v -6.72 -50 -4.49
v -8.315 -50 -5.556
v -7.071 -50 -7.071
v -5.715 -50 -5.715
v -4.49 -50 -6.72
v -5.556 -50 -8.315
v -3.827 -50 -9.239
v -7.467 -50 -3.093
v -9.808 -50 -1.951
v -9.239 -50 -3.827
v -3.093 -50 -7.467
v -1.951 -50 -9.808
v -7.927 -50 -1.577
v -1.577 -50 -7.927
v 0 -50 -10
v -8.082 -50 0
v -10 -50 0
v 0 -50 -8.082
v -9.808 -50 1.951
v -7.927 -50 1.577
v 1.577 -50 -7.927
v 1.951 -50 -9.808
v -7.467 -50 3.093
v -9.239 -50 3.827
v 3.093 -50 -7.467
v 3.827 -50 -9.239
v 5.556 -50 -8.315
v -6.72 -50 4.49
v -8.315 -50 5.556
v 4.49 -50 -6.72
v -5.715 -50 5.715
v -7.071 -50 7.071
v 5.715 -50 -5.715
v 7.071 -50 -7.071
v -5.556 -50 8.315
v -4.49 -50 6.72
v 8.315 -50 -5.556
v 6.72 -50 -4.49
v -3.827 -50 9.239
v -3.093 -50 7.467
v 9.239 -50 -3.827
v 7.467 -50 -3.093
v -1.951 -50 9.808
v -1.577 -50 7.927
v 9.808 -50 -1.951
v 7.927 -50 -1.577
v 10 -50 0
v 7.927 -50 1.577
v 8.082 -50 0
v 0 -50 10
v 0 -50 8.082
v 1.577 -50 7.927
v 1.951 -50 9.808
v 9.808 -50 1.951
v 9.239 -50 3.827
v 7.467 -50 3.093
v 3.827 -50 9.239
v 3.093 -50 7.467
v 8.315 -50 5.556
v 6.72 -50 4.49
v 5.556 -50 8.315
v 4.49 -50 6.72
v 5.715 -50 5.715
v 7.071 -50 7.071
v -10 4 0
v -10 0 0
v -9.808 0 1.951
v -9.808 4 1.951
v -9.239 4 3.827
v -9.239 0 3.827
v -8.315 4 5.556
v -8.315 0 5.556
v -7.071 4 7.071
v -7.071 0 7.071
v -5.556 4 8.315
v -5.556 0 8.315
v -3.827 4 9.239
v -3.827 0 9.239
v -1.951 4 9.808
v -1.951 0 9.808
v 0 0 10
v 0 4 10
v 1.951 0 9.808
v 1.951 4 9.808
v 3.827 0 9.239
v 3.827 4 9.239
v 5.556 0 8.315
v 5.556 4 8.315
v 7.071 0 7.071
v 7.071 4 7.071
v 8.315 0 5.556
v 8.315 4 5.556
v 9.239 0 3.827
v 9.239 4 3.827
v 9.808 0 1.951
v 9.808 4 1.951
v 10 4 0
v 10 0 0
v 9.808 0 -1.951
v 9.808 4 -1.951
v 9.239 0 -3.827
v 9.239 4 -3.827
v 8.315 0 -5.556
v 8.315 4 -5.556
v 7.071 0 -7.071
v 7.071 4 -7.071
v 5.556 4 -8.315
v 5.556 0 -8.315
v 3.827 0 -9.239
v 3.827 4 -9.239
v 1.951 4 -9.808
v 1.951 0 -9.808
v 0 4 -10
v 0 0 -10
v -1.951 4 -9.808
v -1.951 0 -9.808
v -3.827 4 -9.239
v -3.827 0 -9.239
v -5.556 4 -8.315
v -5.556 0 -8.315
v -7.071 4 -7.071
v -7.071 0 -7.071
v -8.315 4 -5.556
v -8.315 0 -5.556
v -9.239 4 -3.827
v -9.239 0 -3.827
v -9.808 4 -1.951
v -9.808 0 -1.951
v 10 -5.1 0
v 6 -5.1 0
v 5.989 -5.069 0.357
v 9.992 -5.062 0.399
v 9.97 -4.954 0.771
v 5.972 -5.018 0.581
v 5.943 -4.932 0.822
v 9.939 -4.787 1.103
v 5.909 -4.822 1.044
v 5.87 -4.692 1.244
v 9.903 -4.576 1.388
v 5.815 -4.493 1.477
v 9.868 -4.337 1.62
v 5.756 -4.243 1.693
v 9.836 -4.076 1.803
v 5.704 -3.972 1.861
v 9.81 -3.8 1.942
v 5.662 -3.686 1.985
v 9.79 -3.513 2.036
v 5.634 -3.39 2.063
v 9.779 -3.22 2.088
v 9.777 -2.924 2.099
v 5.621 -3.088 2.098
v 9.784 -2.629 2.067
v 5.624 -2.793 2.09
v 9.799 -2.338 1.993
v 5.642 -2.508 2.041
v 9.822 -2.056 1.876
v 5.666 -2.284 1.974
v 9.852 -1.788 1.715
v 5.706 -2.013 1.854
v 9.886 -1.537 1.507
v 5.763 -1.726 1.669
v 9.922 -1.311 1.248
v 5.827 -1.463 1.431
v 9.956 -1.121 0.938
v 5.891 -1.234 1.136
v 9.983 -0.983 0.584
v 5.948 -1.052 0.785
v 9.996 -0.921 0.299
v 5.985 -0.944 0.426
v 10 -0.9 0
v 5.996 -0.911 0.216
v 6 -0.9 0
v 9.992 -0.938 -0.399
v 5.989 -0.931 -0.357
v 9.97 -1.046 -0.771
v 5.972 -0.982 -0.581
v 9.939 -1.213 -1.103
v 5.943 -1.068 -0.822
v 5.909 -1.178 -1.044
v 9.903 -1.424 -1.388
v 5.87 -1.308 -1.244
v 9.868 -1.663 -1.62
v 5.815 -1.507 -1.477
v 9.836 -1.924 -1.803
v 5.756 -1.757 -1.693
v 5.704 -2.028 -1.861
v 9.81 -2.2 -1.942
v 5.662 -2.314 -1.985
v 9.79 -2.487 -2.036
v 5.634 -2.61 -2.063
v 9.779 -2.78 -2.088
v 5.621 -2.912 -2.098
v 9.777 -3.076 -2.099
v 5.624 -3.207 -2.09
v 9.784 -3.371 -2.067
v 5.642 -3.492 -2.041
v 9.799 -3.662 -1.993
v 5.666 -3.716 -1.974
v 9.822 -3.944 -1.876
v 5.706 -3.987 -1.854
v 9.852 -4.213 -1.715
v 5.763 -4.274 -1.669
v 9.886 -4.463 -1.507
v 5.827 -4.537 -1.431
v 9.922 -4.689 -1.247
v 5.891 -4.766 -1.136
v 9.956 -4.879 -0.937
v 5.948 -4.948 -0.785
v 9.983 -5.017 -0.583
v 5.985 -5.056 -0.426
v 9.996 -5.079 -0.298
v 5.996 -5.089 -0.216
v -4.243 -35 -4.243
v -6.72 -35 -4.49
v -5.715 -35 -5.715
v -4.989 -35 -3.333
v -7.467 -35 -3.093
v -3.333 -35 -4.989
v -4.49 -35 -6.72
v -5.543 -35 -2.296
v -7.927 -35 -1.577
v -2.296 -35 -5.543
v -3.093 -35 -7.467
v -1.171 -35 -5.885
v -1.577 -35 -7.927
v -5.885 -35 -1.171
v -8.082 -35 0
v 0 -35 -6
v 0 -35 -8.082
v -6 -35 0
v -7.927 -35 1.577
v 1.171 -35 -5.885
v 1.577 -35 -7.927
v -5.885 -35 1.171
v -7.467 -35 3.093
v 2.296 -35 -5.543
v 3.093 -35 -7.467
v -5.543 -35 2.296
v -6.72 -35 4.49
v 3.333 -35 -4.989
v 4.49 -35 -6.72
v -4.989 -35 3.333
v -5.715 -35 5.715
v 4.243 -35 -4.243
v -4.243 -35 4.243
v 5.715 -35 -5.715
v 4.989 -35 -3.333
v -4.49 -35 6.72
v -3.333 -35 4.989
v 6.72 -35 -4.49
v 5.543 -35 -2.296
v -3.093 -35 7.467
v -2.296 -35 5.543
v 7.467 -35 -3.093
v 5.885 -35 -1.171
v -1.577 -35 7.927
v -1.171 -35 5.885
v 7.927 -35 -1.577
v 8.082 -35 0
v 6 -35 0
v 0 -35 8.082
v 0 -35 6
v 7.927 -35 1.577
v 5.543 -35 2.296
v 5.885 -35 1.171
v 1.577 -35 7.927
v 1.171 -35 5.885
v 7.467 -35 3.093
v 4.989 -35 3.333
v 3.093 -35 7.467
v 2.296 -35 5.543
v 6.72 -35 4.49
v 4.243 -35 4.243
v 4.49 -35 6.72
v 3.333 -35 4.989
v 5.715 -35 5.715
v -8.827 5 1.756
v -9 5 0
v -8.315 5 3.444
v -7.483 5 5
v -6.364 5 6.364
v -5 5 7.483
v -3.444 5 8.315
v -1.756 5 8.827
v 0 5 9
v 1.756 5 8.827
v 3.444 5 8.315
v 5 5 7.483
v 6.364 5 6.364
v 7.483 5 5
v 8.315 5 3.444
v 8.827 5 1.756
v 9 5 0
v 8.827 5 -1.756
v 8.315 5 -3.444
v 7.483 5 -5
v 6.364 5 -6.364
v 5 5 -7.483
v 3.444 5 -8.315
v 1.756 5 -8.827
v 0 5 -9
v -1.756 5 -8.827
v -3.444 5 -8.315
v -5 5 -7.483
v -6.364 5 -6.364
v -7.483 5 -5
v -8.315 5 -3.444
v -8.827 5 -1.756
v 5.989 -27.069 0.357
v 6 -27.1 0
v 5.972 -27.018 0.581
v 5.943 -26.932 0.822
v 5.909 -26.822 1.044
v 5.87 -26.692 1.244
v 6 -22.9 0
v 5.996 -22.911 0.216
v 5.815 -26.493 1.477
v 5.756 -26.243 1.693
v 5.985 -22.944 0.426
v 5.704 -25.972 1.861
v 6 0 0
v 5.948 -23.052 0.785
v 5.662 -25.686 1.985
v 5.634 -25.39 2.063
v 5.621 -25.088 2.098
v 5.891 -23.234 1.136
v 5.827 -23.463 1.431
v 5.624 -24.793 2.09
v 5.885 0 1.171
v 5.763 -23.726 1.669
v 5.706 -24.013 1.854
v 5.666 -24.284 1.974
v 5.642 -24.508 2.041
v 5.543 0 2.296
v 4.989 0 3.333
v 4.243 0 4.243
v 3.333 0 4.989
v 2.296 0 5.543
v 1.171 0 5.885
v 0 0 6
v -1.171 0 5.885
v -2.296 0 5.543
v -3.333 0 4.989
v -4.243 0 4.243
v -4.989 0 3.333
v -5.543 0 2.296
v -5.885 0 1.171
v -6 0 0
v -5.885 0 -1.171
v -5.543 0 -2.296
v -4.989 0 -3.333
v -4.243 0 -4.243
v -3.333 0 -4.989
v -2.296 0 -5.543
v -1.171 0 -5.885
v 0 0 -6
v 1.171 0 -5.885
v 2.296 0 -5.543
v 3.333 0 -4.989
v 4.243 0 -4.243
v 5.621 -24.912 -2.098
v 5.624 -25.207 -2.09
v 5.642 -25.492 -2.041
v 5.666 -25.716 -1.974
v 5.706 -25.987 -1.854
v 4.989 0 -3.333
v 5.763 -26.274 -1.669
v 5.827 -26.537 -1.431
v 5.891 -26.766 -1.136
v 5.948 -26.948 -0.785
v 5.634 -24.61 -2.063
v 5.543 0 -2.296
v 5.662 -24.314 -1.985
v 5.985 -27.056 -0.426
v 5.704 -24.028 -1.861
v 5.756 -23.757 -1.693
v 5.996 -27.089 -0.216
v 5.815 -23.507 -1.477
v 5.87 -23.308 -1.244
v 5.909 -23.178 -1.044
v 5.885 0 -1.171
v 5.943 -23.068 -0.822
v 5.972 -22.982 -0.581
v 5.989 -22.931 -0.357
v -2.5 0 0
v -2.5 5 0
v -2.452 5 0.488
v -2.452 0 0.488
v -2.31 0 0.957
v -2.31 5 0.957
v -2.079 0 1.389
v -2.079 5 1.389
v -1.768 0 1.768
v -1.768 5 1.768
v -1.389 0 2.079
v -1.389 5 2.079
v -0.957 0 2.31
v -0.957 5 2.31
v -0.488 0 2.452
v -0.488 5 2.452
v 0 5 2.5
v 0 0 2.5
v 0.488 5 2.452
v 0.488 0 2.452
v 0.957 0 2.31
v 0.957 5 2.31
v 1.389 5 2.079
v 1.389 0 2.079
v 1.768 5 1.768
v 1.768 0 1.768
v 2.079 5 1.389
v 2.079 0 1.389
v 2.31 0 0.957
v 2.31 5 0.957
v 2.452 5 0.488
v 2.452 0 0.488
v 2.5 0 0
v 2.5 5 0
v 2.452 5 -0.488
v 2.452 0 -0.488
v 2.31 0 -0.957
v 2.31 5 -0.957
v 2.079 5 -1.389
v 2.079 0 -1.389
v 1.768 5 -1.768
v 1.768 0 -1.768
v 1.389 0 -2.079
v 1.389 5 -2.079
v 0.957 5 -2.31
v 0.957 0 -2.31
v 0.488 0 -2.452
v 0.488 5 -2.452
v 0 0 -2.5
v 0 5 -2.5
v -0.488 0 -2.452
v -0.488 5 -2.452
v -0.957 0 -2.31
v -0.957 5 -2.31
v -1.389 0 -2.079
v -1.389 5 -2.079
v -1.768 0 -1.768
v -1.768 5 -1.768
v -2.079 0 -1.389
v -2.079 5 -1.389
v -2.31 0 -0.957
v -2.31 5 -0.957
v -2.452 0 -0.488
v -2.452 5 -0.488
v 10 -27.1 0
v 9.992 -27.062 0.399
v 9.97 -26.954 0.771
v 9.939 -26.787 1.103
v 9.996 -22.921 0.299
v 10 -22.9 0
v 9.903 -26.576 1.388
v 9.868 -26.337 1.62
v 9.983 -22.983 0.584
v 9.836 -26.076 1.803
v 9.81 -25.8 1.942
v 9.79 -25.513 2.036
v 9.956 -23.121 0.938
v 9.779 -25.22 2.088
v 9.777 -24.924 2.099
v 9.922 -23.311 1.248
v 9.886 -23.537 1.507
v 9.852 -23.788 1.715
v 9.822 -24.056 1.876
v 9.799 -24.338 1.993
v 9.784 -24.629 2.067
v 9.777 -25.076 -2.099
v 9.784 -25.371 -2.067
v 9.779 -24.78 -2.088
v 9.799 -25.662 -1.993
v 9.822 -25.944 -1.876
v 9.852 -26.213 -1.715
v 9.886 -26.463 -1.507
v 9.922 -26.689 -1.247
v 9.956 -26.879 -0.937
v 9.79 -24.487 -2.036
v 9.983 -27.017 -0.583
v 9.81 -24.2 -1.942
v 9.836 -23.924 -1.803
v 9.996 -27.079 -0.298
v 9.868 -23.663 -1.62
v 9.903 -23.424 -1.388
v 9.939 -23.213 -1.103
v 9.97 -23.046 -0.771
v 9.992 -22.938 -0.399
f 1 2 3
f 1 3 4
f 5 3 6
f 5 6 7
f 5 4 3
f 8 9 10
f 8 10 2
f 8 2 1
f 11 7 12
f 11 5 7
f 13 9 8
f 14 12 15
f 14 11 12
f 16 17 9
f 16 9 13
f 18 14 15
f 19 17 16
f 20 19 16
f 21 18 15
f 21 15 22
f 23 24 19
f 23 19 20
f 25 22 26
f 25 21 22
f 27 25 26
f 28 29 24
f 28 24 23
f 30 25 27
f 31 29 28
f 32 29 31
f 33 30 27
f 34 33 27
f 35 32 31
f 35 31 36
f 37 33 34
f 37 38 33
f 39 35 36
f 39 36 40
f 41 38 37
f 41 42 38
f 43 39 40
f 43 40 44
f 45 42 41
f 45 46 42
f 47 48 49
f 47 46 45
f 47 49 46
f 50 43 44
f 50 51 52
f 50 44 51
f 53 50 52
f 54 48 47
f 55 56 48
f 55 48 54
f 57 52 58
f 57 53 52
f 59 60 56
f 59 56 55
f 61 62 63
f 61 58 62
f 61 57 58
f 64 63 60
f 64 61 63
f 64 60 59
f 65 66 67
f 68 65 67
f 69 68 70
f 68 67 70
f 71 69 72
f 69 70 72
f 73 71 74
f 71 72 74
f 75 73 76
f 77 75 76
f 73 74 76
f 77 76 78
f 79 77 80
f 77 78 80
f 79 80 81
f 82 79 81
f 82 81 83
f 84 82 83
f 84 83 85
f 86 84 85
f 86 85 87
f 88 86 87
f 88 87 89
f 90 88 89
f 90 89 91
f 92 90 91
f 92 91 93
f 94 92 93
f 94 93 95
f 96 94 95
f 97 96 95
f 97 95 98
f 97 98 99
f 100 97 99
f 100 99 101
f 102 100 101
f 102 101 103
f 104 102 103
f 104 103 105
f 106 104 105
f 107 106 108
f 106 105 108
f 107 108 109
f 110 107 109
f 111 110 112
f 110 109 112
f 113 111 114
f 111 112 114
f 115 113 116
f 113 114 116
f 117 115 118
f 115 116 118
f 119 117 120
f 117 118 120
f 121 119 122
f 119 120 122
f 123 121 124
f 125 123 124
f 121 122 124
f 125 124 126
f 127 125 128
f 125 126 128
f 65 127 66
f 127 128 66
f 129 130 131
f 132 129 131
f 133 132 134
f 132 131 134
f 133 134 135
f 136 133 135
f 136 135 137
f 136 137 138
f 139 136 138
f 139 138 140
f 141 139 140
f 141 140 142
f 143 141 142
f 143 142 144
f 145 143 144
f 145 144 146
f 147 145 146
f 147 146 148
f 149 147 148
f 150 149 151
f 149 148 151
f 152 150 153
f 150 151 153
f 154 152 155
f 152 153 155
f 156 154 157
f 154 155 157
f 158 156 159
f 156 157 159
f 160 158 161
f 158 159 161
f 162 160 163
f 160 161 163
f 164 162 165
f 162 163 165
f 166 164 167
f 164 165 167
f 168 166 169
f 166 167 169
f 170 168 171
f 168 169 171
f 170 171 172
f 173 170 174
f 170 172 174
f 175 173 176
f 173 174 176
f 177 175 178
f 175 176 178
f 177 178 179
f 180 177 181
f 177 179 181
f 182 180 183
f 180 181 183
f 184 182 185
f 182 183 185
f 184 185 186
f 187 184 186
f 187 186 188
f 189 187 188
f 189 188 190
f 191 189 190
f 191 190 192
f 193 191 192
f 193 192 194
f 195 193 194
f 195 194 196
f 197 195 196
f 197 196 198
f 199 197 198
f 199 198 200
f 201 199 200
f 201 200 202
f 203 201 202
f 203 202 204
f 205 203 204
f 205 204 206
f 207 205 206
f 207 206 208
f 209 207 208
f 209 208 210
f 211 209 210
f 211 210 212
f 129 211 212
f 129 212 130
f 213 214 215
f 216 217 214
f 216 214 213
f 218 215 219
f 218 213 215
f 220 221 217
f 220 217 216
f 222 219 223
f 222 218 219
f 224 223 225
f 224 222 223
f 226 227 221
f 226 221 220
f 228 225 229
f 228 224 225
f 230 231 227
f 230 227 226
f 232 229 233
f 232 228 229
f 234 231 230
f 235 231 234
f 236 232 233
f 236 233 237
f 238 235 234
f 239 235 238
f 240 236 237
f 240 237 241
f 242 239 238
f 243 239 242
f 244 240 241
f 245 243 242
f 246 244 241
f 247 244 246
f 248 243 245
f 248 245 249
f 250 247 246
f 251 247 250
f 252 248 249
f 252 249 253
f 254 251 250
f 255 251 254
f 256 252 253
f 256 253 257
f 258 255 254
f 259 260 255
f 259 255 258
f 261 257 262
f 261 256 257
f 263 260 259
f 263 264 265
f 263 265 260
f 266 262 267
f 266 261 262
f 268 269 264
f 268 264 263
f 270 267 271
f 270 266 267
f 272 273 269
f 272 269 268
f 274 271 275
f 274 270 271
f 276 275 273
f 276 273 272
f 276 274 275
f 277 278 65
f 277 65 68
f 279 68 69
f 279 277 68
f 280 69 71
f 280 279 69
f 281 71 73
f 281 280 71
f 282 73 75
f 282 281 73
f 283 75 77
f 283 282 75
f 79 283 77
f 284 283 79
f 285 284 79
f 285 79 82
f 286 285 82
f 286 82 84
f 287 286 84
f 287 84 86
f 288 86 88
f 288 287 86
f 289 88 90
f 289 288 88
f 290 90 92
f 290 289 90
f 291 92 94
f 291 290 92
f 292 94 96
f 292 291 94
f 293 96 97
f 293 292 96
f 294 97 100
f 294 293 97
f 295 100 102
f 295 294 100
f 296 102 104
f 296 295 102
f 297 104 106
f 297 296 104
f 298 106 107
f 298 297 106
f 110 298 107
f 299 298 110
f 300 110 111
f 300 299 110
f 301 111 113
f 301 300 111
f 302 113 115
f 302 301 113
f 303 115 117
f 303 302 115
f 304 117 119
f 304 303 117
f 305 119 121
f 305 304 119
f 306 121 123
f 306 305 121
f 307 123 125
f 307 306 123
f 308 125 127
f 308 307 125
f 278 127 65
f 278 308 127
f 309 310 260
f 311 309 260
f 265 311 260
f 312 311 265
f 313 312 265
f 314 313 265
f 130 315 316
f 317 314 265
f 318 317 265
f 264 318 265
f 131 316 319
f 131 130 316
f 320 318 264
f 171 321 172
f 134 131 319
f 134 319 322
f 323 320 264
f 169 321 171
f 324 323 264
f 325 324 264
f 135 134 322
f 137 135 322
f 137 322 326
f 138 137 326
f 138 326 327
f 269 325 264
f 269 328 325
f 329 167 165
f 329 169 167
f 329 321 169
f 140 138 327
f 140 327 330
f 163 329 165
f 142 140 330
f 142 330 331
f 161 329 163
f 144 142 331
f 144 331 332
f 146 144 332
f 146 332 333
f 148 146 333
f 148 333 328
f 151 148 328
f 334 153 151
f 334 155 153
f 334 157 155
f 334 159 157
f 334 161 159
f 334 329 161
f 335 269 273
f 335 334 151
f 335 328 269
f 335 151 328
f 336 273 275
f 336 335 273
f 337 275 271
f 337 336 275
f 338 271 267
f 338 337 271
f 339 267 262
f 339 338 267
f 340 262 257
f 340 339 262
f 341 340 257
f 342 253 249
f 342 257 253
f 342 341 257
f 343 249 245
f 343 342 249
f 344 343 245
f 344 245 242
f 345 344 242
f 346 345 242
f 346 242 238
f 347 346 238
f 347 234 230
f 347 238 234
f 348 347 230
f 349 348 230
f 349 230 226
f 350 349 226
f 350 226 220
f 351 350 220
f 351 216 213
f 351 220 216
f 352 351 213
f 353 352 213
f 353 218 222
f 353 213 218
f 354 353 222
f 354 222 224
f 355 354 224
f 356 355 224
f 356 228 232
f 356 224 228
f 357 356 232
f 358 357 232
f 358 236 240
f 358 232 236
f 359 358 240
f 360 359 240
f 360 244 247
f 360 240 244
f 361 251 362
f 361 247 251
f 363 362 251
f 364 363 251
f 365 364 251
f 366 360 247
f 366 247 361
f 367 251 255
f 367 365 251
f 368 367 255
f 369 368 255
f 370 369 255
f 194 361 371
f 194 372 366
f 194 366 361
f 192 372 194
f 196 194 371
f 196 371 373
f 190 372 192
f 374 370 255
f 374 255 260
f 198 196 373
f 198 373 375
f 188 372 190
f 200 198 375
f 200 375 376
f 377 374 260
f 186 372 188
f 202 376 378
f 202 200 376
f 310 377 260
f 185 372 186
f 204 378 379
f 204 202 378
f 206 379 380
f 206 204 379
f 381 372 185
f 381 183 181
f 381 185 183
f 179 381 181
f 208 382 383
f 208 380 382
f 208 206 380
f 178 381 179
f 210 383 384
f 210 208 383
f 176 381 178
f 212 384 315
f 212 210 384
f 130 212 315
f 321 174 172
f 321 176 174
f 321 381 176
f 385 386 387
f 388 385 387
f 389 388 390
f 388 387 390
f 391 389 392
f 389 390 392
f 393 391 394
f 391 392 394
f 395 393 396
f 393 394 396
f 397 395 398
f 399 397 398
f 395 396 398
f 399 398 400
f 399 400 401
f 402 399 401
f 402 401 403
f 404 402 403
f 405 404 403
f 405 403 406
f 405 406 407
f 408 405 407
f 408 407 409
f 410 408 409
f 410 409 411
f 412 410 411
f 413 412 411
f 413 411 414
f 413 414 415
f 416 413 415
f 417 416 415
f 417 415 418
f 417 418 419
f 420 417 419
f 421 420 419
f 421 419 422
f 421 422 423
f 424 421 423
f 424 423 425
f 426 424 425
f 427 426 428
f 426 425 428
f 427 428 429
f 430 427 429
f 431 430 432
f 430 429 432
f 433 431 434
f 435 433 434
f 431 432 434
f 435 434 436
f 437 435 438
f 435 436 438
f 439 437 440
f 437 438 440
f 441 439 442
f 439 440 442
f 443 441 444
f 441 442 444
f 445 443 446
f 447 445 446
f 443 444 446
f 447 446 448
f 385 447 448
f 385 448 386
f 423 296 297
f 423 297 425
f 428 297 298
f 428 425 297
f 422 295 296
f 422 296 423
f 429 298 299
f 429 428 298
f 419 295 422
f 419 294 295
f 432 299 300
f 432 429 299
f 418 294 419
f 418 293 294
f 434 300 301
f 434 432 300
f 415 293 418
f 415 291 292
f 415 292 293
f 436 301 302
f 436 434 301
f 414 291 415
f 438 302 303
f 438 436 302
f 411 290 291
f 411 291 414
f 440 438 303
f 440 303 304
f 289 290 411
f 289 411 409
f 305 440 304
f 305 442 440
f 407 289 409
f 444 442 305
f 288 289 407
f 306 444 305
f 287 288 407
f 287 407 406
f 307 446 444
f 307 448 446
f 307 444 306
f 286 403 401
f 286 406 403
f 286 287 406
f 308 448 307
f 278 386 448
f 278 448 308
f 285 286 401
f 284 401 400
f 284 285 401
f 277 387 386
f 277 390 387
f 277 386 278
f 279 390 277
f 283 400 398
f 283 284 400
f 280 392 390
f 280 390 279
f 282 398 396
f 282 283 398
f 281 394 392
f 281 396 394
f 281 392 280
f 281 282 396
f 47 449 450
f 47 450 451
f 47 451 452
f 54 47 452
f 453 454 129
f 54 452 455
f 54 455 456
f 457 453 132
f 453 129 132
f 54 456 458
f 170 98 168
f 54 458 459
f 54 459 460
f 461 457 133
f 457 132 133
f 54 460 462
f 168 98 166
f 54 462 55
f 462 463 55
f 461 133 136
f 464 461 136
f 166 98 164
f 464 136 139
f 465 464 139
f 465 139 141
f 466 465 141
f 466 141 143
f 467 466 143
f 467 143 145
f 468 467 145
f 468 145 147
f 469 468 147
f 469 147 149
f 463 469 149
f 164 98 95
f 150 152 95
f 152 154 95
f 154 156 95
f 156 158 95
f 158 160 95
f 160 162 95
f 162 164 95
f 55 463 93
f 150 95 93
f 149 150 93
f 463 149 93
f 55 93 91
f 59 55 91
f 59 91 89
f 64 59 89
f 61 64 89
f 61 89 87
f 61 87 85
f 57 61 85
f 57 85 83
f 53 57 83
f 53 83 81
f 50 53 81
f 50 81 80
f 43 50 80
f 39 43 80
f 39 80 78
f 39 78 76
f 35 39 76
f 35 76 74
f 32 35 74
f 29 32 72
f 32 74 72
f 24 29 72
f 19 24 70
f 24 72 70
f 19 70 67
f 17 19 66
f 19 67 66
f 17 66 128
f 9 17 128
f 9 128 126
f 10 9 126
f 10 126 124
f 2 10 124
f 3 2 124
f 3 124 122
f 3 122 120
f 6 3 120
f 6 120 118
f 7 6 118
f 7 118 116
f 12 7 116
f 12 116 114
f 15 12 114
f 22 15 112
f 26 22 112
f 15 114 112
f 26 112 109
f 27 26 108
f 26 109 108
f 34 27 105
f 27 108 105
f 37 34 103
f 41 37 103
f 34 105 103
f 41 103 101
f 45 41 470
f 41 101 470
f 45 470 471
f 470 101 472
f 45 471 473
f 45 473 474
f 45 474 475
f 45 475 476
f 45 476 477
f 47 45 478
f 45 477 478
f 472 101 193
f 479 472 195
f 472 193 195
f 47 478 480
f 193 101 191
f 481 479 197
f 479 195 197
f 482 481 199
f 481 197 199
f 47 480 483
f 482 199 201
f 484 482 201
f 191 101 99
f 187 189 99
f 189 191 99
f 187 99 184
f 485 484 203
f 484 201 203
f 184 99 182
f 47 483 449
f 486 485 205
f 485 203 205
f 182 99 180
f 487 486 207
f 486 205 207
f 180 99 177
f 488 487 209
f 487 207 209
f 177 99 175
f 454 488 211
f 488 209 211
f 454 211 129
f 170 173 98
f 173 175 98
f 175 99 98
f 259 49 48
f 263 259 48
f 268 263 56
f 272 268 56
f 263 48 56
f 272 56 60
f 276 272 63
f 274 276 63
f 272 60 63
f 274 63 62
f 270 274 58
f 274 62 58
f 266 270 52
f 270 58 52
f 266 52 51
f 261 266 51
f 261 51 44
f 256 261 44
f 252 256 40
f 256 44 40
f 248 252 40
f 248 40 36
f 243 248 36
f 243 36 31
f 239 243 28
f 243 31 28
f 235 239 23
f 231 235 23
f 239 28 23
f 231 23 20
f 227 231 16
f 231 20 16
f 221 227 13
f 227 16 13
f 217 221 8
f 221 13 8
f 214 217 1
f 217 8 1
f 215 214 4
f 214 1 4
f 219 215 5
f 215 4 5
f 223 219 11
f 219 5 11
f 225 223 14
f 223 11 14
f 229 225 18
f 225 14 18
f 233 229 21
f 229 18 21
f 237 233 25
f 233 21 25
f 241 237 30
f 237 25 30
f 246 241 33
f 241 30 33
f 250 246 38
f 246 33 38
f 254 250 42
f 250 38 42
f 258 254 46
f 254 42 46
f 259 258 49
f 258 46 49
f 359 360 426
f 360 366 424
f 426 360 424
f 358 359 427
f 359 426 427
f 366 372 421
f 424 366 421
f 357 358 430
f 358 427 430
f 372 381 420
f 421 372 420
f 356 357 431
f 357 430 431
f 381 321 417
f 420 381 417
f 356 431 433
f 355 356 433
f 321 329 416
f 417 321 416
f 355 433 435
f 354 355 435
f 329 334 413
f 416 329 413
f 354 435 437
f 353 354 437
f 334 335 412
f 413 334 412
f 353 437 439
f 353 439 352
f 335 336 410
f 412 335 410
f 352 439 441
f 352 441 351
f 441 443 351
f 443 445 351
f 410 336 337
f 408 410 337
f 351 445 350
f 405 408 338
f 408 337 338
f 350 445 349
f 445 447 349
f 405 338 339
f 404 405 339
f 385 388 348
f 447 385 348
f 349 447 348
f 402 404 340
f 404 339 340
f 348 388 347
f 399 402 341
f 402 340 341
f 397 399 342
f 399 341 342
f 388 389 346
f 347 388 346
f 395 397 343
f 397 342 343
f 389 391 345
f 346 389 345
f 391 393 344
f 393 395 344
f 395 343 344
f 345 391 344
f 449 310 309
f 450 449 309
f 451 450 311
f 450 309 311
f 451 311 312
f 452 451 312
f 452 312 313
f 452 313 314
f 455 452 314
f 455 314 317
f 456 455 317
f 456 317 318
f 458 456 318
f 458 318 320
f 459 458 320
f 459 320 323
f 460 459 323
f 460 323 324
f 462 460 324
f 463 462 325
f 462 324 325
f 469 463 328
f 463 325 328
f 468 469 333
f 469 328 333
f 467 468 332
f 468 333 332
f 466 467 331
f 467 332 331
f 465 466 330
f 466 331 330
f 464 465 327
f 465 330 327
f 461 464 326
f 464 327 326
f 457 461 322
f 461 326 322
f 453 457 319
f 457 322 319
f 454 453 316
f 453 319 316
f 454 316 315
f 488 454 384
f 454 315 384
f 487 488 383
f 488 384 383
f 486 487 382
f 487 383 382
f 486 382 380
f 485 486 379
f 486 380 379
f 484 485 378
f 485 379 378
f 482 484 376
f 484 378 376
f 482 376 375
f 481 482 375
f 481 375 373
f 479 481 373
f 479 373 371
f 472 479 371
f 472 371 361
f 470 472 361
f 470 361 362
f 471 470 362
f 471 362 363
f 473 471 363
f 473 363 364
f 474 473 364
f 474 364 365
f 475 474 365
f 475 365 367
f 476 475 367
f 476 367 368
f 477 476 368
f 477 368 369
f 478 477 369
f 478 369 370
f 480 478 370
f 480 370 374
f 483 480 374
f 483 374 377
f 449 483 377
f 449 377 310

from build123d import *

# Parameters (mm, degrees)
F0_R      = 10
F0_R_2    = 6
F1_DEPTH  = 50
F2_R      = 10
F3_DEPTH  = 5
F4_R      = 8.0824379909
F5_DEPTH  = 15
F6_R      = 2.5
F7_DEPTH  = 55.001
F8_SIZE   = 1
F11_D     = 4.2
F11_DEPTH = 7.4
F11_START = 0.2229862
F11_TIP   = 1.2618073


with BuildPart() as f1:
    # F0 (on Front) → F1 (new body)
    with BuildSketch(Plane.XZ):
        Circle(F0_R)
        Circle(F0_R_2, mode=Mode.SUBTRACT)
    extrude(amount=F1_DEPTH)

    # F2 (on face) → F3 (join)
    with BuildSketch(Plane(origin=(0, 0, 0), x_dir=(-1, 0, 0), z_dir=(0, 1, 0))):
        Circle(F2_R)
    extrude(amount=F3_DEPTH)

    # F4 (on face) → F5 (cut)
    with BuildSketch(Plane.XZ.offset(50)):
        Circle(F4_R)
    extrude(amount=-F5_DEPTH, mode=Mode.SUBTRACT)

    # F6 (on face) → F7 (cut, through all)
    with BuildSketch(Plane(origin=(0, 5, 0), x_dir=(-1, 0, 0), z_dir=(0, 1, 0))):
        Circle(F6_R)
    extrude(amount=-F7_DEPTH, mode=Mode.SUBTRACT)

    # F8
    f8_edges = [f1.edges().sort_by_distance(p)[0] for p in [
        (10, 5, 0),
    ]]
    chamfer(f8_edges, length=F8_SIZE)

    # F11
    # its depths count from where the whole tool has entered the part; down to there all is cleared
    with Locations(Plane.YZ.offset(10).offset(-F11_START)):
        with Locations((-25, 0), (-3, 0)):
            Hole(F11_D / 2, depth=F11_DEPTH)
            with Locations((0, 0, -(F11_DEPTH + F11_TIP / 2))):  # 118° drill point
                Cone(0, F11_D / 2, F11_TIP, mode=Mode.SUBTRACT)


solid = f1.part
